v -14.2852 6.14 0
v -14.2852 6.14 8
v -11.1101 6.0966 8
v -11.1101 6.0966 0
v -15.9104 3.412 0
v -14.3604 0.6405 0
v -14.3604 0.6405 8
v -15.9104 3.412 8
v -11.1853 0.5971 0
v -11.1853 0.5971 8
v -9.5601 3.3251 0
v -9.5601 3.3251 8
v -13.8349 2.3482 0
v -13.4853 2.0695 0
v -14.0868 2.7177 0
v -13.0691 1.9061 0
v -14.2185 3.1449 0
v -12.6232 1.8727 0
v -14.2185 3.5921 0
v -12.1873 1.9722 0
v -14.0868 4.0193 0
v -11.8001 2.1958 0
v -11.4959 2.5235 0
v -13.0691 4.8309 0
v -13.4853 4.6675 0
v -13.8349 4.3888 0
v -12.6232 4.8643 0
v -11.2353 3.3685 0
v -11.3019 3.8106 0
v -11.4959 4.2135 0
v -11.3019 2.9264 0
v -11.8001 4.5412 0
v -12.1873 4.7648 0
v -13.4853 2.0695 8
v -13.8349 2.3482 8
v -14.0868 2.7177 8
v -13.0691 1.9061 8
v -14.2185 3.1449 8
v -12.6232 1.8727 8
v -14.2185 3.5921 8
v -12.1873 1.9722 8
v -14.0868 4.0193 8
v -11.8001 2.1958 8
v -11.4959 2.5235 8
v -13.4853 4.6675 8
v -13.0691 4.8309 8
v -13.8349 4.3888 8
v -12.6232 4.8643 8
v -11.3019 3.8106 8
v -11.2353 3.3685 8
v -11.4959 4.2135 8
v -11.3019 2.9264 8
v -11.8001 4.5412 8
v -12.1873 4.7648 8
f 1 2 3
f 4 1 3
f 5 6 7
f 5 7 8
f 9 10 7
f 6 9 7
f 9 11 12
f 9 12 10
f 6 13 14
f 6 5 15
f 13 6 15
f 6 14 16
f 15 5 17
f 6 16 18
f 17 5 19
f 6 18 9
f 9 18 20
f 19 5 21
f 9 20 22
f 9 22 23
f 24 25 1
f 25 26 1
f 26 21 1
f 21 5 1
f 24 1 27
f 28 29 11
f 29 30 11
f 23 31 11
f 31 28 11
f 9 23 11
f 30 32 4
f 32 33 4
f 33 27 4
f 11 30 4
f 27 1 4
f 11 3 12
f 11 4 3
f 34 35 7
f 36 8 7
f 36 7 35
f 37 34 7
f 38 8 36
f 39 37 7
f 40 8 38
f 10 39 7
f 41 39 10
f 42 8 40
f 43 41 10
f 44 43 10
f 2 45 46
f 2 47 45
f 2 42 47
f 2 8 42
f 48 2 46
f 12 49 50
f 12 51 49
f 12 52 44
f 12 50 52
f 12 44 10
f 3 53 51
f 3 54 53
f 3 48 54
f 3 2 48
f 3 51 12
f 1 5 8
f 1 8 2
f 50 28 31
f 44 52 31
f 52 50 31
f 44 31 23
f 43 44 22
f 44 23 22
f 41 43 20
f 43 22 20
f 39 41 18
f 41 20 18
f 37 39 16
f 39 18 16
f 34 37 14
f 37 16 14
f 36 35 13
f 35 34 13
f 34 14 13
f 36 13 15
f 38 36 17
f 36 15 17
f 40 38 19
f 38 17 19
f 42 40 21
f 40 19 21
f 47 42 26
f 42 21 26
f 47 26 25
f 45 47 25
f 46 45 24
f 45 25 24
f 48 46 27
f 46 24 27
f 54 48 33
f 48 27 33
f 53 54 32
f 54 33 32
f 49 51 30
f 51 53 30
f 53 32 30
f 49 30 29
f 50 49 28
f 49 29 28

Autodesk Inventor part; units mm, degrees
ref_plane "YZ Plane" through (0, 0, 0) normal (1, 0, 0) x (0, 1, 0)
ref_plane "XZ Plane" through (0, 0, 0) normal (0, 1, 0) x (-1, 0, 0)
ref_plane "XY Plane" through (0, 0, 0) normal (0, 0, 1) x (1, 0, 0)
sketch "Sketch1" plane through (0, 0, 0) normal (0, 0, 1) x (1, 0, 0)
  line L0 (-11.1101, 6.0966) -> (-9.5601, 3.3251)
  line L1 (-9.5601, 3.3251) -> (-11.1853, 0.5971)
  line L2 (-11.1853, 0.5971) -> (-14.3604, 0.6405)
  line L3 (-14.3604, 0.6405) -> (-15.9104, 3.412)
  line L4 (-15.9104, 3.412) -> (-14.2852, 6.14)
  line L5 (-14.2852, 6.14) -> (-11.1101, 6.0966)
  circle A0 centre (-12.7353, 3.3685) radius 1.5
  dimension "d0" = 5.5
  dimension "d1" = 3
extrude "Extrusion1" add sketch "Sketch1" along normal blind 8
thread "Thread2" size "M3x0.5" class "6H" standard "ANSI Metric M Profile" length 3.7
thread "Thread3" size "M3x0.5" class "6H" standard "ANSI Metric M Profile" length 3.7
properties part number "Espaciador para Electrónica 5mm" material "Acetal Resin, White"
